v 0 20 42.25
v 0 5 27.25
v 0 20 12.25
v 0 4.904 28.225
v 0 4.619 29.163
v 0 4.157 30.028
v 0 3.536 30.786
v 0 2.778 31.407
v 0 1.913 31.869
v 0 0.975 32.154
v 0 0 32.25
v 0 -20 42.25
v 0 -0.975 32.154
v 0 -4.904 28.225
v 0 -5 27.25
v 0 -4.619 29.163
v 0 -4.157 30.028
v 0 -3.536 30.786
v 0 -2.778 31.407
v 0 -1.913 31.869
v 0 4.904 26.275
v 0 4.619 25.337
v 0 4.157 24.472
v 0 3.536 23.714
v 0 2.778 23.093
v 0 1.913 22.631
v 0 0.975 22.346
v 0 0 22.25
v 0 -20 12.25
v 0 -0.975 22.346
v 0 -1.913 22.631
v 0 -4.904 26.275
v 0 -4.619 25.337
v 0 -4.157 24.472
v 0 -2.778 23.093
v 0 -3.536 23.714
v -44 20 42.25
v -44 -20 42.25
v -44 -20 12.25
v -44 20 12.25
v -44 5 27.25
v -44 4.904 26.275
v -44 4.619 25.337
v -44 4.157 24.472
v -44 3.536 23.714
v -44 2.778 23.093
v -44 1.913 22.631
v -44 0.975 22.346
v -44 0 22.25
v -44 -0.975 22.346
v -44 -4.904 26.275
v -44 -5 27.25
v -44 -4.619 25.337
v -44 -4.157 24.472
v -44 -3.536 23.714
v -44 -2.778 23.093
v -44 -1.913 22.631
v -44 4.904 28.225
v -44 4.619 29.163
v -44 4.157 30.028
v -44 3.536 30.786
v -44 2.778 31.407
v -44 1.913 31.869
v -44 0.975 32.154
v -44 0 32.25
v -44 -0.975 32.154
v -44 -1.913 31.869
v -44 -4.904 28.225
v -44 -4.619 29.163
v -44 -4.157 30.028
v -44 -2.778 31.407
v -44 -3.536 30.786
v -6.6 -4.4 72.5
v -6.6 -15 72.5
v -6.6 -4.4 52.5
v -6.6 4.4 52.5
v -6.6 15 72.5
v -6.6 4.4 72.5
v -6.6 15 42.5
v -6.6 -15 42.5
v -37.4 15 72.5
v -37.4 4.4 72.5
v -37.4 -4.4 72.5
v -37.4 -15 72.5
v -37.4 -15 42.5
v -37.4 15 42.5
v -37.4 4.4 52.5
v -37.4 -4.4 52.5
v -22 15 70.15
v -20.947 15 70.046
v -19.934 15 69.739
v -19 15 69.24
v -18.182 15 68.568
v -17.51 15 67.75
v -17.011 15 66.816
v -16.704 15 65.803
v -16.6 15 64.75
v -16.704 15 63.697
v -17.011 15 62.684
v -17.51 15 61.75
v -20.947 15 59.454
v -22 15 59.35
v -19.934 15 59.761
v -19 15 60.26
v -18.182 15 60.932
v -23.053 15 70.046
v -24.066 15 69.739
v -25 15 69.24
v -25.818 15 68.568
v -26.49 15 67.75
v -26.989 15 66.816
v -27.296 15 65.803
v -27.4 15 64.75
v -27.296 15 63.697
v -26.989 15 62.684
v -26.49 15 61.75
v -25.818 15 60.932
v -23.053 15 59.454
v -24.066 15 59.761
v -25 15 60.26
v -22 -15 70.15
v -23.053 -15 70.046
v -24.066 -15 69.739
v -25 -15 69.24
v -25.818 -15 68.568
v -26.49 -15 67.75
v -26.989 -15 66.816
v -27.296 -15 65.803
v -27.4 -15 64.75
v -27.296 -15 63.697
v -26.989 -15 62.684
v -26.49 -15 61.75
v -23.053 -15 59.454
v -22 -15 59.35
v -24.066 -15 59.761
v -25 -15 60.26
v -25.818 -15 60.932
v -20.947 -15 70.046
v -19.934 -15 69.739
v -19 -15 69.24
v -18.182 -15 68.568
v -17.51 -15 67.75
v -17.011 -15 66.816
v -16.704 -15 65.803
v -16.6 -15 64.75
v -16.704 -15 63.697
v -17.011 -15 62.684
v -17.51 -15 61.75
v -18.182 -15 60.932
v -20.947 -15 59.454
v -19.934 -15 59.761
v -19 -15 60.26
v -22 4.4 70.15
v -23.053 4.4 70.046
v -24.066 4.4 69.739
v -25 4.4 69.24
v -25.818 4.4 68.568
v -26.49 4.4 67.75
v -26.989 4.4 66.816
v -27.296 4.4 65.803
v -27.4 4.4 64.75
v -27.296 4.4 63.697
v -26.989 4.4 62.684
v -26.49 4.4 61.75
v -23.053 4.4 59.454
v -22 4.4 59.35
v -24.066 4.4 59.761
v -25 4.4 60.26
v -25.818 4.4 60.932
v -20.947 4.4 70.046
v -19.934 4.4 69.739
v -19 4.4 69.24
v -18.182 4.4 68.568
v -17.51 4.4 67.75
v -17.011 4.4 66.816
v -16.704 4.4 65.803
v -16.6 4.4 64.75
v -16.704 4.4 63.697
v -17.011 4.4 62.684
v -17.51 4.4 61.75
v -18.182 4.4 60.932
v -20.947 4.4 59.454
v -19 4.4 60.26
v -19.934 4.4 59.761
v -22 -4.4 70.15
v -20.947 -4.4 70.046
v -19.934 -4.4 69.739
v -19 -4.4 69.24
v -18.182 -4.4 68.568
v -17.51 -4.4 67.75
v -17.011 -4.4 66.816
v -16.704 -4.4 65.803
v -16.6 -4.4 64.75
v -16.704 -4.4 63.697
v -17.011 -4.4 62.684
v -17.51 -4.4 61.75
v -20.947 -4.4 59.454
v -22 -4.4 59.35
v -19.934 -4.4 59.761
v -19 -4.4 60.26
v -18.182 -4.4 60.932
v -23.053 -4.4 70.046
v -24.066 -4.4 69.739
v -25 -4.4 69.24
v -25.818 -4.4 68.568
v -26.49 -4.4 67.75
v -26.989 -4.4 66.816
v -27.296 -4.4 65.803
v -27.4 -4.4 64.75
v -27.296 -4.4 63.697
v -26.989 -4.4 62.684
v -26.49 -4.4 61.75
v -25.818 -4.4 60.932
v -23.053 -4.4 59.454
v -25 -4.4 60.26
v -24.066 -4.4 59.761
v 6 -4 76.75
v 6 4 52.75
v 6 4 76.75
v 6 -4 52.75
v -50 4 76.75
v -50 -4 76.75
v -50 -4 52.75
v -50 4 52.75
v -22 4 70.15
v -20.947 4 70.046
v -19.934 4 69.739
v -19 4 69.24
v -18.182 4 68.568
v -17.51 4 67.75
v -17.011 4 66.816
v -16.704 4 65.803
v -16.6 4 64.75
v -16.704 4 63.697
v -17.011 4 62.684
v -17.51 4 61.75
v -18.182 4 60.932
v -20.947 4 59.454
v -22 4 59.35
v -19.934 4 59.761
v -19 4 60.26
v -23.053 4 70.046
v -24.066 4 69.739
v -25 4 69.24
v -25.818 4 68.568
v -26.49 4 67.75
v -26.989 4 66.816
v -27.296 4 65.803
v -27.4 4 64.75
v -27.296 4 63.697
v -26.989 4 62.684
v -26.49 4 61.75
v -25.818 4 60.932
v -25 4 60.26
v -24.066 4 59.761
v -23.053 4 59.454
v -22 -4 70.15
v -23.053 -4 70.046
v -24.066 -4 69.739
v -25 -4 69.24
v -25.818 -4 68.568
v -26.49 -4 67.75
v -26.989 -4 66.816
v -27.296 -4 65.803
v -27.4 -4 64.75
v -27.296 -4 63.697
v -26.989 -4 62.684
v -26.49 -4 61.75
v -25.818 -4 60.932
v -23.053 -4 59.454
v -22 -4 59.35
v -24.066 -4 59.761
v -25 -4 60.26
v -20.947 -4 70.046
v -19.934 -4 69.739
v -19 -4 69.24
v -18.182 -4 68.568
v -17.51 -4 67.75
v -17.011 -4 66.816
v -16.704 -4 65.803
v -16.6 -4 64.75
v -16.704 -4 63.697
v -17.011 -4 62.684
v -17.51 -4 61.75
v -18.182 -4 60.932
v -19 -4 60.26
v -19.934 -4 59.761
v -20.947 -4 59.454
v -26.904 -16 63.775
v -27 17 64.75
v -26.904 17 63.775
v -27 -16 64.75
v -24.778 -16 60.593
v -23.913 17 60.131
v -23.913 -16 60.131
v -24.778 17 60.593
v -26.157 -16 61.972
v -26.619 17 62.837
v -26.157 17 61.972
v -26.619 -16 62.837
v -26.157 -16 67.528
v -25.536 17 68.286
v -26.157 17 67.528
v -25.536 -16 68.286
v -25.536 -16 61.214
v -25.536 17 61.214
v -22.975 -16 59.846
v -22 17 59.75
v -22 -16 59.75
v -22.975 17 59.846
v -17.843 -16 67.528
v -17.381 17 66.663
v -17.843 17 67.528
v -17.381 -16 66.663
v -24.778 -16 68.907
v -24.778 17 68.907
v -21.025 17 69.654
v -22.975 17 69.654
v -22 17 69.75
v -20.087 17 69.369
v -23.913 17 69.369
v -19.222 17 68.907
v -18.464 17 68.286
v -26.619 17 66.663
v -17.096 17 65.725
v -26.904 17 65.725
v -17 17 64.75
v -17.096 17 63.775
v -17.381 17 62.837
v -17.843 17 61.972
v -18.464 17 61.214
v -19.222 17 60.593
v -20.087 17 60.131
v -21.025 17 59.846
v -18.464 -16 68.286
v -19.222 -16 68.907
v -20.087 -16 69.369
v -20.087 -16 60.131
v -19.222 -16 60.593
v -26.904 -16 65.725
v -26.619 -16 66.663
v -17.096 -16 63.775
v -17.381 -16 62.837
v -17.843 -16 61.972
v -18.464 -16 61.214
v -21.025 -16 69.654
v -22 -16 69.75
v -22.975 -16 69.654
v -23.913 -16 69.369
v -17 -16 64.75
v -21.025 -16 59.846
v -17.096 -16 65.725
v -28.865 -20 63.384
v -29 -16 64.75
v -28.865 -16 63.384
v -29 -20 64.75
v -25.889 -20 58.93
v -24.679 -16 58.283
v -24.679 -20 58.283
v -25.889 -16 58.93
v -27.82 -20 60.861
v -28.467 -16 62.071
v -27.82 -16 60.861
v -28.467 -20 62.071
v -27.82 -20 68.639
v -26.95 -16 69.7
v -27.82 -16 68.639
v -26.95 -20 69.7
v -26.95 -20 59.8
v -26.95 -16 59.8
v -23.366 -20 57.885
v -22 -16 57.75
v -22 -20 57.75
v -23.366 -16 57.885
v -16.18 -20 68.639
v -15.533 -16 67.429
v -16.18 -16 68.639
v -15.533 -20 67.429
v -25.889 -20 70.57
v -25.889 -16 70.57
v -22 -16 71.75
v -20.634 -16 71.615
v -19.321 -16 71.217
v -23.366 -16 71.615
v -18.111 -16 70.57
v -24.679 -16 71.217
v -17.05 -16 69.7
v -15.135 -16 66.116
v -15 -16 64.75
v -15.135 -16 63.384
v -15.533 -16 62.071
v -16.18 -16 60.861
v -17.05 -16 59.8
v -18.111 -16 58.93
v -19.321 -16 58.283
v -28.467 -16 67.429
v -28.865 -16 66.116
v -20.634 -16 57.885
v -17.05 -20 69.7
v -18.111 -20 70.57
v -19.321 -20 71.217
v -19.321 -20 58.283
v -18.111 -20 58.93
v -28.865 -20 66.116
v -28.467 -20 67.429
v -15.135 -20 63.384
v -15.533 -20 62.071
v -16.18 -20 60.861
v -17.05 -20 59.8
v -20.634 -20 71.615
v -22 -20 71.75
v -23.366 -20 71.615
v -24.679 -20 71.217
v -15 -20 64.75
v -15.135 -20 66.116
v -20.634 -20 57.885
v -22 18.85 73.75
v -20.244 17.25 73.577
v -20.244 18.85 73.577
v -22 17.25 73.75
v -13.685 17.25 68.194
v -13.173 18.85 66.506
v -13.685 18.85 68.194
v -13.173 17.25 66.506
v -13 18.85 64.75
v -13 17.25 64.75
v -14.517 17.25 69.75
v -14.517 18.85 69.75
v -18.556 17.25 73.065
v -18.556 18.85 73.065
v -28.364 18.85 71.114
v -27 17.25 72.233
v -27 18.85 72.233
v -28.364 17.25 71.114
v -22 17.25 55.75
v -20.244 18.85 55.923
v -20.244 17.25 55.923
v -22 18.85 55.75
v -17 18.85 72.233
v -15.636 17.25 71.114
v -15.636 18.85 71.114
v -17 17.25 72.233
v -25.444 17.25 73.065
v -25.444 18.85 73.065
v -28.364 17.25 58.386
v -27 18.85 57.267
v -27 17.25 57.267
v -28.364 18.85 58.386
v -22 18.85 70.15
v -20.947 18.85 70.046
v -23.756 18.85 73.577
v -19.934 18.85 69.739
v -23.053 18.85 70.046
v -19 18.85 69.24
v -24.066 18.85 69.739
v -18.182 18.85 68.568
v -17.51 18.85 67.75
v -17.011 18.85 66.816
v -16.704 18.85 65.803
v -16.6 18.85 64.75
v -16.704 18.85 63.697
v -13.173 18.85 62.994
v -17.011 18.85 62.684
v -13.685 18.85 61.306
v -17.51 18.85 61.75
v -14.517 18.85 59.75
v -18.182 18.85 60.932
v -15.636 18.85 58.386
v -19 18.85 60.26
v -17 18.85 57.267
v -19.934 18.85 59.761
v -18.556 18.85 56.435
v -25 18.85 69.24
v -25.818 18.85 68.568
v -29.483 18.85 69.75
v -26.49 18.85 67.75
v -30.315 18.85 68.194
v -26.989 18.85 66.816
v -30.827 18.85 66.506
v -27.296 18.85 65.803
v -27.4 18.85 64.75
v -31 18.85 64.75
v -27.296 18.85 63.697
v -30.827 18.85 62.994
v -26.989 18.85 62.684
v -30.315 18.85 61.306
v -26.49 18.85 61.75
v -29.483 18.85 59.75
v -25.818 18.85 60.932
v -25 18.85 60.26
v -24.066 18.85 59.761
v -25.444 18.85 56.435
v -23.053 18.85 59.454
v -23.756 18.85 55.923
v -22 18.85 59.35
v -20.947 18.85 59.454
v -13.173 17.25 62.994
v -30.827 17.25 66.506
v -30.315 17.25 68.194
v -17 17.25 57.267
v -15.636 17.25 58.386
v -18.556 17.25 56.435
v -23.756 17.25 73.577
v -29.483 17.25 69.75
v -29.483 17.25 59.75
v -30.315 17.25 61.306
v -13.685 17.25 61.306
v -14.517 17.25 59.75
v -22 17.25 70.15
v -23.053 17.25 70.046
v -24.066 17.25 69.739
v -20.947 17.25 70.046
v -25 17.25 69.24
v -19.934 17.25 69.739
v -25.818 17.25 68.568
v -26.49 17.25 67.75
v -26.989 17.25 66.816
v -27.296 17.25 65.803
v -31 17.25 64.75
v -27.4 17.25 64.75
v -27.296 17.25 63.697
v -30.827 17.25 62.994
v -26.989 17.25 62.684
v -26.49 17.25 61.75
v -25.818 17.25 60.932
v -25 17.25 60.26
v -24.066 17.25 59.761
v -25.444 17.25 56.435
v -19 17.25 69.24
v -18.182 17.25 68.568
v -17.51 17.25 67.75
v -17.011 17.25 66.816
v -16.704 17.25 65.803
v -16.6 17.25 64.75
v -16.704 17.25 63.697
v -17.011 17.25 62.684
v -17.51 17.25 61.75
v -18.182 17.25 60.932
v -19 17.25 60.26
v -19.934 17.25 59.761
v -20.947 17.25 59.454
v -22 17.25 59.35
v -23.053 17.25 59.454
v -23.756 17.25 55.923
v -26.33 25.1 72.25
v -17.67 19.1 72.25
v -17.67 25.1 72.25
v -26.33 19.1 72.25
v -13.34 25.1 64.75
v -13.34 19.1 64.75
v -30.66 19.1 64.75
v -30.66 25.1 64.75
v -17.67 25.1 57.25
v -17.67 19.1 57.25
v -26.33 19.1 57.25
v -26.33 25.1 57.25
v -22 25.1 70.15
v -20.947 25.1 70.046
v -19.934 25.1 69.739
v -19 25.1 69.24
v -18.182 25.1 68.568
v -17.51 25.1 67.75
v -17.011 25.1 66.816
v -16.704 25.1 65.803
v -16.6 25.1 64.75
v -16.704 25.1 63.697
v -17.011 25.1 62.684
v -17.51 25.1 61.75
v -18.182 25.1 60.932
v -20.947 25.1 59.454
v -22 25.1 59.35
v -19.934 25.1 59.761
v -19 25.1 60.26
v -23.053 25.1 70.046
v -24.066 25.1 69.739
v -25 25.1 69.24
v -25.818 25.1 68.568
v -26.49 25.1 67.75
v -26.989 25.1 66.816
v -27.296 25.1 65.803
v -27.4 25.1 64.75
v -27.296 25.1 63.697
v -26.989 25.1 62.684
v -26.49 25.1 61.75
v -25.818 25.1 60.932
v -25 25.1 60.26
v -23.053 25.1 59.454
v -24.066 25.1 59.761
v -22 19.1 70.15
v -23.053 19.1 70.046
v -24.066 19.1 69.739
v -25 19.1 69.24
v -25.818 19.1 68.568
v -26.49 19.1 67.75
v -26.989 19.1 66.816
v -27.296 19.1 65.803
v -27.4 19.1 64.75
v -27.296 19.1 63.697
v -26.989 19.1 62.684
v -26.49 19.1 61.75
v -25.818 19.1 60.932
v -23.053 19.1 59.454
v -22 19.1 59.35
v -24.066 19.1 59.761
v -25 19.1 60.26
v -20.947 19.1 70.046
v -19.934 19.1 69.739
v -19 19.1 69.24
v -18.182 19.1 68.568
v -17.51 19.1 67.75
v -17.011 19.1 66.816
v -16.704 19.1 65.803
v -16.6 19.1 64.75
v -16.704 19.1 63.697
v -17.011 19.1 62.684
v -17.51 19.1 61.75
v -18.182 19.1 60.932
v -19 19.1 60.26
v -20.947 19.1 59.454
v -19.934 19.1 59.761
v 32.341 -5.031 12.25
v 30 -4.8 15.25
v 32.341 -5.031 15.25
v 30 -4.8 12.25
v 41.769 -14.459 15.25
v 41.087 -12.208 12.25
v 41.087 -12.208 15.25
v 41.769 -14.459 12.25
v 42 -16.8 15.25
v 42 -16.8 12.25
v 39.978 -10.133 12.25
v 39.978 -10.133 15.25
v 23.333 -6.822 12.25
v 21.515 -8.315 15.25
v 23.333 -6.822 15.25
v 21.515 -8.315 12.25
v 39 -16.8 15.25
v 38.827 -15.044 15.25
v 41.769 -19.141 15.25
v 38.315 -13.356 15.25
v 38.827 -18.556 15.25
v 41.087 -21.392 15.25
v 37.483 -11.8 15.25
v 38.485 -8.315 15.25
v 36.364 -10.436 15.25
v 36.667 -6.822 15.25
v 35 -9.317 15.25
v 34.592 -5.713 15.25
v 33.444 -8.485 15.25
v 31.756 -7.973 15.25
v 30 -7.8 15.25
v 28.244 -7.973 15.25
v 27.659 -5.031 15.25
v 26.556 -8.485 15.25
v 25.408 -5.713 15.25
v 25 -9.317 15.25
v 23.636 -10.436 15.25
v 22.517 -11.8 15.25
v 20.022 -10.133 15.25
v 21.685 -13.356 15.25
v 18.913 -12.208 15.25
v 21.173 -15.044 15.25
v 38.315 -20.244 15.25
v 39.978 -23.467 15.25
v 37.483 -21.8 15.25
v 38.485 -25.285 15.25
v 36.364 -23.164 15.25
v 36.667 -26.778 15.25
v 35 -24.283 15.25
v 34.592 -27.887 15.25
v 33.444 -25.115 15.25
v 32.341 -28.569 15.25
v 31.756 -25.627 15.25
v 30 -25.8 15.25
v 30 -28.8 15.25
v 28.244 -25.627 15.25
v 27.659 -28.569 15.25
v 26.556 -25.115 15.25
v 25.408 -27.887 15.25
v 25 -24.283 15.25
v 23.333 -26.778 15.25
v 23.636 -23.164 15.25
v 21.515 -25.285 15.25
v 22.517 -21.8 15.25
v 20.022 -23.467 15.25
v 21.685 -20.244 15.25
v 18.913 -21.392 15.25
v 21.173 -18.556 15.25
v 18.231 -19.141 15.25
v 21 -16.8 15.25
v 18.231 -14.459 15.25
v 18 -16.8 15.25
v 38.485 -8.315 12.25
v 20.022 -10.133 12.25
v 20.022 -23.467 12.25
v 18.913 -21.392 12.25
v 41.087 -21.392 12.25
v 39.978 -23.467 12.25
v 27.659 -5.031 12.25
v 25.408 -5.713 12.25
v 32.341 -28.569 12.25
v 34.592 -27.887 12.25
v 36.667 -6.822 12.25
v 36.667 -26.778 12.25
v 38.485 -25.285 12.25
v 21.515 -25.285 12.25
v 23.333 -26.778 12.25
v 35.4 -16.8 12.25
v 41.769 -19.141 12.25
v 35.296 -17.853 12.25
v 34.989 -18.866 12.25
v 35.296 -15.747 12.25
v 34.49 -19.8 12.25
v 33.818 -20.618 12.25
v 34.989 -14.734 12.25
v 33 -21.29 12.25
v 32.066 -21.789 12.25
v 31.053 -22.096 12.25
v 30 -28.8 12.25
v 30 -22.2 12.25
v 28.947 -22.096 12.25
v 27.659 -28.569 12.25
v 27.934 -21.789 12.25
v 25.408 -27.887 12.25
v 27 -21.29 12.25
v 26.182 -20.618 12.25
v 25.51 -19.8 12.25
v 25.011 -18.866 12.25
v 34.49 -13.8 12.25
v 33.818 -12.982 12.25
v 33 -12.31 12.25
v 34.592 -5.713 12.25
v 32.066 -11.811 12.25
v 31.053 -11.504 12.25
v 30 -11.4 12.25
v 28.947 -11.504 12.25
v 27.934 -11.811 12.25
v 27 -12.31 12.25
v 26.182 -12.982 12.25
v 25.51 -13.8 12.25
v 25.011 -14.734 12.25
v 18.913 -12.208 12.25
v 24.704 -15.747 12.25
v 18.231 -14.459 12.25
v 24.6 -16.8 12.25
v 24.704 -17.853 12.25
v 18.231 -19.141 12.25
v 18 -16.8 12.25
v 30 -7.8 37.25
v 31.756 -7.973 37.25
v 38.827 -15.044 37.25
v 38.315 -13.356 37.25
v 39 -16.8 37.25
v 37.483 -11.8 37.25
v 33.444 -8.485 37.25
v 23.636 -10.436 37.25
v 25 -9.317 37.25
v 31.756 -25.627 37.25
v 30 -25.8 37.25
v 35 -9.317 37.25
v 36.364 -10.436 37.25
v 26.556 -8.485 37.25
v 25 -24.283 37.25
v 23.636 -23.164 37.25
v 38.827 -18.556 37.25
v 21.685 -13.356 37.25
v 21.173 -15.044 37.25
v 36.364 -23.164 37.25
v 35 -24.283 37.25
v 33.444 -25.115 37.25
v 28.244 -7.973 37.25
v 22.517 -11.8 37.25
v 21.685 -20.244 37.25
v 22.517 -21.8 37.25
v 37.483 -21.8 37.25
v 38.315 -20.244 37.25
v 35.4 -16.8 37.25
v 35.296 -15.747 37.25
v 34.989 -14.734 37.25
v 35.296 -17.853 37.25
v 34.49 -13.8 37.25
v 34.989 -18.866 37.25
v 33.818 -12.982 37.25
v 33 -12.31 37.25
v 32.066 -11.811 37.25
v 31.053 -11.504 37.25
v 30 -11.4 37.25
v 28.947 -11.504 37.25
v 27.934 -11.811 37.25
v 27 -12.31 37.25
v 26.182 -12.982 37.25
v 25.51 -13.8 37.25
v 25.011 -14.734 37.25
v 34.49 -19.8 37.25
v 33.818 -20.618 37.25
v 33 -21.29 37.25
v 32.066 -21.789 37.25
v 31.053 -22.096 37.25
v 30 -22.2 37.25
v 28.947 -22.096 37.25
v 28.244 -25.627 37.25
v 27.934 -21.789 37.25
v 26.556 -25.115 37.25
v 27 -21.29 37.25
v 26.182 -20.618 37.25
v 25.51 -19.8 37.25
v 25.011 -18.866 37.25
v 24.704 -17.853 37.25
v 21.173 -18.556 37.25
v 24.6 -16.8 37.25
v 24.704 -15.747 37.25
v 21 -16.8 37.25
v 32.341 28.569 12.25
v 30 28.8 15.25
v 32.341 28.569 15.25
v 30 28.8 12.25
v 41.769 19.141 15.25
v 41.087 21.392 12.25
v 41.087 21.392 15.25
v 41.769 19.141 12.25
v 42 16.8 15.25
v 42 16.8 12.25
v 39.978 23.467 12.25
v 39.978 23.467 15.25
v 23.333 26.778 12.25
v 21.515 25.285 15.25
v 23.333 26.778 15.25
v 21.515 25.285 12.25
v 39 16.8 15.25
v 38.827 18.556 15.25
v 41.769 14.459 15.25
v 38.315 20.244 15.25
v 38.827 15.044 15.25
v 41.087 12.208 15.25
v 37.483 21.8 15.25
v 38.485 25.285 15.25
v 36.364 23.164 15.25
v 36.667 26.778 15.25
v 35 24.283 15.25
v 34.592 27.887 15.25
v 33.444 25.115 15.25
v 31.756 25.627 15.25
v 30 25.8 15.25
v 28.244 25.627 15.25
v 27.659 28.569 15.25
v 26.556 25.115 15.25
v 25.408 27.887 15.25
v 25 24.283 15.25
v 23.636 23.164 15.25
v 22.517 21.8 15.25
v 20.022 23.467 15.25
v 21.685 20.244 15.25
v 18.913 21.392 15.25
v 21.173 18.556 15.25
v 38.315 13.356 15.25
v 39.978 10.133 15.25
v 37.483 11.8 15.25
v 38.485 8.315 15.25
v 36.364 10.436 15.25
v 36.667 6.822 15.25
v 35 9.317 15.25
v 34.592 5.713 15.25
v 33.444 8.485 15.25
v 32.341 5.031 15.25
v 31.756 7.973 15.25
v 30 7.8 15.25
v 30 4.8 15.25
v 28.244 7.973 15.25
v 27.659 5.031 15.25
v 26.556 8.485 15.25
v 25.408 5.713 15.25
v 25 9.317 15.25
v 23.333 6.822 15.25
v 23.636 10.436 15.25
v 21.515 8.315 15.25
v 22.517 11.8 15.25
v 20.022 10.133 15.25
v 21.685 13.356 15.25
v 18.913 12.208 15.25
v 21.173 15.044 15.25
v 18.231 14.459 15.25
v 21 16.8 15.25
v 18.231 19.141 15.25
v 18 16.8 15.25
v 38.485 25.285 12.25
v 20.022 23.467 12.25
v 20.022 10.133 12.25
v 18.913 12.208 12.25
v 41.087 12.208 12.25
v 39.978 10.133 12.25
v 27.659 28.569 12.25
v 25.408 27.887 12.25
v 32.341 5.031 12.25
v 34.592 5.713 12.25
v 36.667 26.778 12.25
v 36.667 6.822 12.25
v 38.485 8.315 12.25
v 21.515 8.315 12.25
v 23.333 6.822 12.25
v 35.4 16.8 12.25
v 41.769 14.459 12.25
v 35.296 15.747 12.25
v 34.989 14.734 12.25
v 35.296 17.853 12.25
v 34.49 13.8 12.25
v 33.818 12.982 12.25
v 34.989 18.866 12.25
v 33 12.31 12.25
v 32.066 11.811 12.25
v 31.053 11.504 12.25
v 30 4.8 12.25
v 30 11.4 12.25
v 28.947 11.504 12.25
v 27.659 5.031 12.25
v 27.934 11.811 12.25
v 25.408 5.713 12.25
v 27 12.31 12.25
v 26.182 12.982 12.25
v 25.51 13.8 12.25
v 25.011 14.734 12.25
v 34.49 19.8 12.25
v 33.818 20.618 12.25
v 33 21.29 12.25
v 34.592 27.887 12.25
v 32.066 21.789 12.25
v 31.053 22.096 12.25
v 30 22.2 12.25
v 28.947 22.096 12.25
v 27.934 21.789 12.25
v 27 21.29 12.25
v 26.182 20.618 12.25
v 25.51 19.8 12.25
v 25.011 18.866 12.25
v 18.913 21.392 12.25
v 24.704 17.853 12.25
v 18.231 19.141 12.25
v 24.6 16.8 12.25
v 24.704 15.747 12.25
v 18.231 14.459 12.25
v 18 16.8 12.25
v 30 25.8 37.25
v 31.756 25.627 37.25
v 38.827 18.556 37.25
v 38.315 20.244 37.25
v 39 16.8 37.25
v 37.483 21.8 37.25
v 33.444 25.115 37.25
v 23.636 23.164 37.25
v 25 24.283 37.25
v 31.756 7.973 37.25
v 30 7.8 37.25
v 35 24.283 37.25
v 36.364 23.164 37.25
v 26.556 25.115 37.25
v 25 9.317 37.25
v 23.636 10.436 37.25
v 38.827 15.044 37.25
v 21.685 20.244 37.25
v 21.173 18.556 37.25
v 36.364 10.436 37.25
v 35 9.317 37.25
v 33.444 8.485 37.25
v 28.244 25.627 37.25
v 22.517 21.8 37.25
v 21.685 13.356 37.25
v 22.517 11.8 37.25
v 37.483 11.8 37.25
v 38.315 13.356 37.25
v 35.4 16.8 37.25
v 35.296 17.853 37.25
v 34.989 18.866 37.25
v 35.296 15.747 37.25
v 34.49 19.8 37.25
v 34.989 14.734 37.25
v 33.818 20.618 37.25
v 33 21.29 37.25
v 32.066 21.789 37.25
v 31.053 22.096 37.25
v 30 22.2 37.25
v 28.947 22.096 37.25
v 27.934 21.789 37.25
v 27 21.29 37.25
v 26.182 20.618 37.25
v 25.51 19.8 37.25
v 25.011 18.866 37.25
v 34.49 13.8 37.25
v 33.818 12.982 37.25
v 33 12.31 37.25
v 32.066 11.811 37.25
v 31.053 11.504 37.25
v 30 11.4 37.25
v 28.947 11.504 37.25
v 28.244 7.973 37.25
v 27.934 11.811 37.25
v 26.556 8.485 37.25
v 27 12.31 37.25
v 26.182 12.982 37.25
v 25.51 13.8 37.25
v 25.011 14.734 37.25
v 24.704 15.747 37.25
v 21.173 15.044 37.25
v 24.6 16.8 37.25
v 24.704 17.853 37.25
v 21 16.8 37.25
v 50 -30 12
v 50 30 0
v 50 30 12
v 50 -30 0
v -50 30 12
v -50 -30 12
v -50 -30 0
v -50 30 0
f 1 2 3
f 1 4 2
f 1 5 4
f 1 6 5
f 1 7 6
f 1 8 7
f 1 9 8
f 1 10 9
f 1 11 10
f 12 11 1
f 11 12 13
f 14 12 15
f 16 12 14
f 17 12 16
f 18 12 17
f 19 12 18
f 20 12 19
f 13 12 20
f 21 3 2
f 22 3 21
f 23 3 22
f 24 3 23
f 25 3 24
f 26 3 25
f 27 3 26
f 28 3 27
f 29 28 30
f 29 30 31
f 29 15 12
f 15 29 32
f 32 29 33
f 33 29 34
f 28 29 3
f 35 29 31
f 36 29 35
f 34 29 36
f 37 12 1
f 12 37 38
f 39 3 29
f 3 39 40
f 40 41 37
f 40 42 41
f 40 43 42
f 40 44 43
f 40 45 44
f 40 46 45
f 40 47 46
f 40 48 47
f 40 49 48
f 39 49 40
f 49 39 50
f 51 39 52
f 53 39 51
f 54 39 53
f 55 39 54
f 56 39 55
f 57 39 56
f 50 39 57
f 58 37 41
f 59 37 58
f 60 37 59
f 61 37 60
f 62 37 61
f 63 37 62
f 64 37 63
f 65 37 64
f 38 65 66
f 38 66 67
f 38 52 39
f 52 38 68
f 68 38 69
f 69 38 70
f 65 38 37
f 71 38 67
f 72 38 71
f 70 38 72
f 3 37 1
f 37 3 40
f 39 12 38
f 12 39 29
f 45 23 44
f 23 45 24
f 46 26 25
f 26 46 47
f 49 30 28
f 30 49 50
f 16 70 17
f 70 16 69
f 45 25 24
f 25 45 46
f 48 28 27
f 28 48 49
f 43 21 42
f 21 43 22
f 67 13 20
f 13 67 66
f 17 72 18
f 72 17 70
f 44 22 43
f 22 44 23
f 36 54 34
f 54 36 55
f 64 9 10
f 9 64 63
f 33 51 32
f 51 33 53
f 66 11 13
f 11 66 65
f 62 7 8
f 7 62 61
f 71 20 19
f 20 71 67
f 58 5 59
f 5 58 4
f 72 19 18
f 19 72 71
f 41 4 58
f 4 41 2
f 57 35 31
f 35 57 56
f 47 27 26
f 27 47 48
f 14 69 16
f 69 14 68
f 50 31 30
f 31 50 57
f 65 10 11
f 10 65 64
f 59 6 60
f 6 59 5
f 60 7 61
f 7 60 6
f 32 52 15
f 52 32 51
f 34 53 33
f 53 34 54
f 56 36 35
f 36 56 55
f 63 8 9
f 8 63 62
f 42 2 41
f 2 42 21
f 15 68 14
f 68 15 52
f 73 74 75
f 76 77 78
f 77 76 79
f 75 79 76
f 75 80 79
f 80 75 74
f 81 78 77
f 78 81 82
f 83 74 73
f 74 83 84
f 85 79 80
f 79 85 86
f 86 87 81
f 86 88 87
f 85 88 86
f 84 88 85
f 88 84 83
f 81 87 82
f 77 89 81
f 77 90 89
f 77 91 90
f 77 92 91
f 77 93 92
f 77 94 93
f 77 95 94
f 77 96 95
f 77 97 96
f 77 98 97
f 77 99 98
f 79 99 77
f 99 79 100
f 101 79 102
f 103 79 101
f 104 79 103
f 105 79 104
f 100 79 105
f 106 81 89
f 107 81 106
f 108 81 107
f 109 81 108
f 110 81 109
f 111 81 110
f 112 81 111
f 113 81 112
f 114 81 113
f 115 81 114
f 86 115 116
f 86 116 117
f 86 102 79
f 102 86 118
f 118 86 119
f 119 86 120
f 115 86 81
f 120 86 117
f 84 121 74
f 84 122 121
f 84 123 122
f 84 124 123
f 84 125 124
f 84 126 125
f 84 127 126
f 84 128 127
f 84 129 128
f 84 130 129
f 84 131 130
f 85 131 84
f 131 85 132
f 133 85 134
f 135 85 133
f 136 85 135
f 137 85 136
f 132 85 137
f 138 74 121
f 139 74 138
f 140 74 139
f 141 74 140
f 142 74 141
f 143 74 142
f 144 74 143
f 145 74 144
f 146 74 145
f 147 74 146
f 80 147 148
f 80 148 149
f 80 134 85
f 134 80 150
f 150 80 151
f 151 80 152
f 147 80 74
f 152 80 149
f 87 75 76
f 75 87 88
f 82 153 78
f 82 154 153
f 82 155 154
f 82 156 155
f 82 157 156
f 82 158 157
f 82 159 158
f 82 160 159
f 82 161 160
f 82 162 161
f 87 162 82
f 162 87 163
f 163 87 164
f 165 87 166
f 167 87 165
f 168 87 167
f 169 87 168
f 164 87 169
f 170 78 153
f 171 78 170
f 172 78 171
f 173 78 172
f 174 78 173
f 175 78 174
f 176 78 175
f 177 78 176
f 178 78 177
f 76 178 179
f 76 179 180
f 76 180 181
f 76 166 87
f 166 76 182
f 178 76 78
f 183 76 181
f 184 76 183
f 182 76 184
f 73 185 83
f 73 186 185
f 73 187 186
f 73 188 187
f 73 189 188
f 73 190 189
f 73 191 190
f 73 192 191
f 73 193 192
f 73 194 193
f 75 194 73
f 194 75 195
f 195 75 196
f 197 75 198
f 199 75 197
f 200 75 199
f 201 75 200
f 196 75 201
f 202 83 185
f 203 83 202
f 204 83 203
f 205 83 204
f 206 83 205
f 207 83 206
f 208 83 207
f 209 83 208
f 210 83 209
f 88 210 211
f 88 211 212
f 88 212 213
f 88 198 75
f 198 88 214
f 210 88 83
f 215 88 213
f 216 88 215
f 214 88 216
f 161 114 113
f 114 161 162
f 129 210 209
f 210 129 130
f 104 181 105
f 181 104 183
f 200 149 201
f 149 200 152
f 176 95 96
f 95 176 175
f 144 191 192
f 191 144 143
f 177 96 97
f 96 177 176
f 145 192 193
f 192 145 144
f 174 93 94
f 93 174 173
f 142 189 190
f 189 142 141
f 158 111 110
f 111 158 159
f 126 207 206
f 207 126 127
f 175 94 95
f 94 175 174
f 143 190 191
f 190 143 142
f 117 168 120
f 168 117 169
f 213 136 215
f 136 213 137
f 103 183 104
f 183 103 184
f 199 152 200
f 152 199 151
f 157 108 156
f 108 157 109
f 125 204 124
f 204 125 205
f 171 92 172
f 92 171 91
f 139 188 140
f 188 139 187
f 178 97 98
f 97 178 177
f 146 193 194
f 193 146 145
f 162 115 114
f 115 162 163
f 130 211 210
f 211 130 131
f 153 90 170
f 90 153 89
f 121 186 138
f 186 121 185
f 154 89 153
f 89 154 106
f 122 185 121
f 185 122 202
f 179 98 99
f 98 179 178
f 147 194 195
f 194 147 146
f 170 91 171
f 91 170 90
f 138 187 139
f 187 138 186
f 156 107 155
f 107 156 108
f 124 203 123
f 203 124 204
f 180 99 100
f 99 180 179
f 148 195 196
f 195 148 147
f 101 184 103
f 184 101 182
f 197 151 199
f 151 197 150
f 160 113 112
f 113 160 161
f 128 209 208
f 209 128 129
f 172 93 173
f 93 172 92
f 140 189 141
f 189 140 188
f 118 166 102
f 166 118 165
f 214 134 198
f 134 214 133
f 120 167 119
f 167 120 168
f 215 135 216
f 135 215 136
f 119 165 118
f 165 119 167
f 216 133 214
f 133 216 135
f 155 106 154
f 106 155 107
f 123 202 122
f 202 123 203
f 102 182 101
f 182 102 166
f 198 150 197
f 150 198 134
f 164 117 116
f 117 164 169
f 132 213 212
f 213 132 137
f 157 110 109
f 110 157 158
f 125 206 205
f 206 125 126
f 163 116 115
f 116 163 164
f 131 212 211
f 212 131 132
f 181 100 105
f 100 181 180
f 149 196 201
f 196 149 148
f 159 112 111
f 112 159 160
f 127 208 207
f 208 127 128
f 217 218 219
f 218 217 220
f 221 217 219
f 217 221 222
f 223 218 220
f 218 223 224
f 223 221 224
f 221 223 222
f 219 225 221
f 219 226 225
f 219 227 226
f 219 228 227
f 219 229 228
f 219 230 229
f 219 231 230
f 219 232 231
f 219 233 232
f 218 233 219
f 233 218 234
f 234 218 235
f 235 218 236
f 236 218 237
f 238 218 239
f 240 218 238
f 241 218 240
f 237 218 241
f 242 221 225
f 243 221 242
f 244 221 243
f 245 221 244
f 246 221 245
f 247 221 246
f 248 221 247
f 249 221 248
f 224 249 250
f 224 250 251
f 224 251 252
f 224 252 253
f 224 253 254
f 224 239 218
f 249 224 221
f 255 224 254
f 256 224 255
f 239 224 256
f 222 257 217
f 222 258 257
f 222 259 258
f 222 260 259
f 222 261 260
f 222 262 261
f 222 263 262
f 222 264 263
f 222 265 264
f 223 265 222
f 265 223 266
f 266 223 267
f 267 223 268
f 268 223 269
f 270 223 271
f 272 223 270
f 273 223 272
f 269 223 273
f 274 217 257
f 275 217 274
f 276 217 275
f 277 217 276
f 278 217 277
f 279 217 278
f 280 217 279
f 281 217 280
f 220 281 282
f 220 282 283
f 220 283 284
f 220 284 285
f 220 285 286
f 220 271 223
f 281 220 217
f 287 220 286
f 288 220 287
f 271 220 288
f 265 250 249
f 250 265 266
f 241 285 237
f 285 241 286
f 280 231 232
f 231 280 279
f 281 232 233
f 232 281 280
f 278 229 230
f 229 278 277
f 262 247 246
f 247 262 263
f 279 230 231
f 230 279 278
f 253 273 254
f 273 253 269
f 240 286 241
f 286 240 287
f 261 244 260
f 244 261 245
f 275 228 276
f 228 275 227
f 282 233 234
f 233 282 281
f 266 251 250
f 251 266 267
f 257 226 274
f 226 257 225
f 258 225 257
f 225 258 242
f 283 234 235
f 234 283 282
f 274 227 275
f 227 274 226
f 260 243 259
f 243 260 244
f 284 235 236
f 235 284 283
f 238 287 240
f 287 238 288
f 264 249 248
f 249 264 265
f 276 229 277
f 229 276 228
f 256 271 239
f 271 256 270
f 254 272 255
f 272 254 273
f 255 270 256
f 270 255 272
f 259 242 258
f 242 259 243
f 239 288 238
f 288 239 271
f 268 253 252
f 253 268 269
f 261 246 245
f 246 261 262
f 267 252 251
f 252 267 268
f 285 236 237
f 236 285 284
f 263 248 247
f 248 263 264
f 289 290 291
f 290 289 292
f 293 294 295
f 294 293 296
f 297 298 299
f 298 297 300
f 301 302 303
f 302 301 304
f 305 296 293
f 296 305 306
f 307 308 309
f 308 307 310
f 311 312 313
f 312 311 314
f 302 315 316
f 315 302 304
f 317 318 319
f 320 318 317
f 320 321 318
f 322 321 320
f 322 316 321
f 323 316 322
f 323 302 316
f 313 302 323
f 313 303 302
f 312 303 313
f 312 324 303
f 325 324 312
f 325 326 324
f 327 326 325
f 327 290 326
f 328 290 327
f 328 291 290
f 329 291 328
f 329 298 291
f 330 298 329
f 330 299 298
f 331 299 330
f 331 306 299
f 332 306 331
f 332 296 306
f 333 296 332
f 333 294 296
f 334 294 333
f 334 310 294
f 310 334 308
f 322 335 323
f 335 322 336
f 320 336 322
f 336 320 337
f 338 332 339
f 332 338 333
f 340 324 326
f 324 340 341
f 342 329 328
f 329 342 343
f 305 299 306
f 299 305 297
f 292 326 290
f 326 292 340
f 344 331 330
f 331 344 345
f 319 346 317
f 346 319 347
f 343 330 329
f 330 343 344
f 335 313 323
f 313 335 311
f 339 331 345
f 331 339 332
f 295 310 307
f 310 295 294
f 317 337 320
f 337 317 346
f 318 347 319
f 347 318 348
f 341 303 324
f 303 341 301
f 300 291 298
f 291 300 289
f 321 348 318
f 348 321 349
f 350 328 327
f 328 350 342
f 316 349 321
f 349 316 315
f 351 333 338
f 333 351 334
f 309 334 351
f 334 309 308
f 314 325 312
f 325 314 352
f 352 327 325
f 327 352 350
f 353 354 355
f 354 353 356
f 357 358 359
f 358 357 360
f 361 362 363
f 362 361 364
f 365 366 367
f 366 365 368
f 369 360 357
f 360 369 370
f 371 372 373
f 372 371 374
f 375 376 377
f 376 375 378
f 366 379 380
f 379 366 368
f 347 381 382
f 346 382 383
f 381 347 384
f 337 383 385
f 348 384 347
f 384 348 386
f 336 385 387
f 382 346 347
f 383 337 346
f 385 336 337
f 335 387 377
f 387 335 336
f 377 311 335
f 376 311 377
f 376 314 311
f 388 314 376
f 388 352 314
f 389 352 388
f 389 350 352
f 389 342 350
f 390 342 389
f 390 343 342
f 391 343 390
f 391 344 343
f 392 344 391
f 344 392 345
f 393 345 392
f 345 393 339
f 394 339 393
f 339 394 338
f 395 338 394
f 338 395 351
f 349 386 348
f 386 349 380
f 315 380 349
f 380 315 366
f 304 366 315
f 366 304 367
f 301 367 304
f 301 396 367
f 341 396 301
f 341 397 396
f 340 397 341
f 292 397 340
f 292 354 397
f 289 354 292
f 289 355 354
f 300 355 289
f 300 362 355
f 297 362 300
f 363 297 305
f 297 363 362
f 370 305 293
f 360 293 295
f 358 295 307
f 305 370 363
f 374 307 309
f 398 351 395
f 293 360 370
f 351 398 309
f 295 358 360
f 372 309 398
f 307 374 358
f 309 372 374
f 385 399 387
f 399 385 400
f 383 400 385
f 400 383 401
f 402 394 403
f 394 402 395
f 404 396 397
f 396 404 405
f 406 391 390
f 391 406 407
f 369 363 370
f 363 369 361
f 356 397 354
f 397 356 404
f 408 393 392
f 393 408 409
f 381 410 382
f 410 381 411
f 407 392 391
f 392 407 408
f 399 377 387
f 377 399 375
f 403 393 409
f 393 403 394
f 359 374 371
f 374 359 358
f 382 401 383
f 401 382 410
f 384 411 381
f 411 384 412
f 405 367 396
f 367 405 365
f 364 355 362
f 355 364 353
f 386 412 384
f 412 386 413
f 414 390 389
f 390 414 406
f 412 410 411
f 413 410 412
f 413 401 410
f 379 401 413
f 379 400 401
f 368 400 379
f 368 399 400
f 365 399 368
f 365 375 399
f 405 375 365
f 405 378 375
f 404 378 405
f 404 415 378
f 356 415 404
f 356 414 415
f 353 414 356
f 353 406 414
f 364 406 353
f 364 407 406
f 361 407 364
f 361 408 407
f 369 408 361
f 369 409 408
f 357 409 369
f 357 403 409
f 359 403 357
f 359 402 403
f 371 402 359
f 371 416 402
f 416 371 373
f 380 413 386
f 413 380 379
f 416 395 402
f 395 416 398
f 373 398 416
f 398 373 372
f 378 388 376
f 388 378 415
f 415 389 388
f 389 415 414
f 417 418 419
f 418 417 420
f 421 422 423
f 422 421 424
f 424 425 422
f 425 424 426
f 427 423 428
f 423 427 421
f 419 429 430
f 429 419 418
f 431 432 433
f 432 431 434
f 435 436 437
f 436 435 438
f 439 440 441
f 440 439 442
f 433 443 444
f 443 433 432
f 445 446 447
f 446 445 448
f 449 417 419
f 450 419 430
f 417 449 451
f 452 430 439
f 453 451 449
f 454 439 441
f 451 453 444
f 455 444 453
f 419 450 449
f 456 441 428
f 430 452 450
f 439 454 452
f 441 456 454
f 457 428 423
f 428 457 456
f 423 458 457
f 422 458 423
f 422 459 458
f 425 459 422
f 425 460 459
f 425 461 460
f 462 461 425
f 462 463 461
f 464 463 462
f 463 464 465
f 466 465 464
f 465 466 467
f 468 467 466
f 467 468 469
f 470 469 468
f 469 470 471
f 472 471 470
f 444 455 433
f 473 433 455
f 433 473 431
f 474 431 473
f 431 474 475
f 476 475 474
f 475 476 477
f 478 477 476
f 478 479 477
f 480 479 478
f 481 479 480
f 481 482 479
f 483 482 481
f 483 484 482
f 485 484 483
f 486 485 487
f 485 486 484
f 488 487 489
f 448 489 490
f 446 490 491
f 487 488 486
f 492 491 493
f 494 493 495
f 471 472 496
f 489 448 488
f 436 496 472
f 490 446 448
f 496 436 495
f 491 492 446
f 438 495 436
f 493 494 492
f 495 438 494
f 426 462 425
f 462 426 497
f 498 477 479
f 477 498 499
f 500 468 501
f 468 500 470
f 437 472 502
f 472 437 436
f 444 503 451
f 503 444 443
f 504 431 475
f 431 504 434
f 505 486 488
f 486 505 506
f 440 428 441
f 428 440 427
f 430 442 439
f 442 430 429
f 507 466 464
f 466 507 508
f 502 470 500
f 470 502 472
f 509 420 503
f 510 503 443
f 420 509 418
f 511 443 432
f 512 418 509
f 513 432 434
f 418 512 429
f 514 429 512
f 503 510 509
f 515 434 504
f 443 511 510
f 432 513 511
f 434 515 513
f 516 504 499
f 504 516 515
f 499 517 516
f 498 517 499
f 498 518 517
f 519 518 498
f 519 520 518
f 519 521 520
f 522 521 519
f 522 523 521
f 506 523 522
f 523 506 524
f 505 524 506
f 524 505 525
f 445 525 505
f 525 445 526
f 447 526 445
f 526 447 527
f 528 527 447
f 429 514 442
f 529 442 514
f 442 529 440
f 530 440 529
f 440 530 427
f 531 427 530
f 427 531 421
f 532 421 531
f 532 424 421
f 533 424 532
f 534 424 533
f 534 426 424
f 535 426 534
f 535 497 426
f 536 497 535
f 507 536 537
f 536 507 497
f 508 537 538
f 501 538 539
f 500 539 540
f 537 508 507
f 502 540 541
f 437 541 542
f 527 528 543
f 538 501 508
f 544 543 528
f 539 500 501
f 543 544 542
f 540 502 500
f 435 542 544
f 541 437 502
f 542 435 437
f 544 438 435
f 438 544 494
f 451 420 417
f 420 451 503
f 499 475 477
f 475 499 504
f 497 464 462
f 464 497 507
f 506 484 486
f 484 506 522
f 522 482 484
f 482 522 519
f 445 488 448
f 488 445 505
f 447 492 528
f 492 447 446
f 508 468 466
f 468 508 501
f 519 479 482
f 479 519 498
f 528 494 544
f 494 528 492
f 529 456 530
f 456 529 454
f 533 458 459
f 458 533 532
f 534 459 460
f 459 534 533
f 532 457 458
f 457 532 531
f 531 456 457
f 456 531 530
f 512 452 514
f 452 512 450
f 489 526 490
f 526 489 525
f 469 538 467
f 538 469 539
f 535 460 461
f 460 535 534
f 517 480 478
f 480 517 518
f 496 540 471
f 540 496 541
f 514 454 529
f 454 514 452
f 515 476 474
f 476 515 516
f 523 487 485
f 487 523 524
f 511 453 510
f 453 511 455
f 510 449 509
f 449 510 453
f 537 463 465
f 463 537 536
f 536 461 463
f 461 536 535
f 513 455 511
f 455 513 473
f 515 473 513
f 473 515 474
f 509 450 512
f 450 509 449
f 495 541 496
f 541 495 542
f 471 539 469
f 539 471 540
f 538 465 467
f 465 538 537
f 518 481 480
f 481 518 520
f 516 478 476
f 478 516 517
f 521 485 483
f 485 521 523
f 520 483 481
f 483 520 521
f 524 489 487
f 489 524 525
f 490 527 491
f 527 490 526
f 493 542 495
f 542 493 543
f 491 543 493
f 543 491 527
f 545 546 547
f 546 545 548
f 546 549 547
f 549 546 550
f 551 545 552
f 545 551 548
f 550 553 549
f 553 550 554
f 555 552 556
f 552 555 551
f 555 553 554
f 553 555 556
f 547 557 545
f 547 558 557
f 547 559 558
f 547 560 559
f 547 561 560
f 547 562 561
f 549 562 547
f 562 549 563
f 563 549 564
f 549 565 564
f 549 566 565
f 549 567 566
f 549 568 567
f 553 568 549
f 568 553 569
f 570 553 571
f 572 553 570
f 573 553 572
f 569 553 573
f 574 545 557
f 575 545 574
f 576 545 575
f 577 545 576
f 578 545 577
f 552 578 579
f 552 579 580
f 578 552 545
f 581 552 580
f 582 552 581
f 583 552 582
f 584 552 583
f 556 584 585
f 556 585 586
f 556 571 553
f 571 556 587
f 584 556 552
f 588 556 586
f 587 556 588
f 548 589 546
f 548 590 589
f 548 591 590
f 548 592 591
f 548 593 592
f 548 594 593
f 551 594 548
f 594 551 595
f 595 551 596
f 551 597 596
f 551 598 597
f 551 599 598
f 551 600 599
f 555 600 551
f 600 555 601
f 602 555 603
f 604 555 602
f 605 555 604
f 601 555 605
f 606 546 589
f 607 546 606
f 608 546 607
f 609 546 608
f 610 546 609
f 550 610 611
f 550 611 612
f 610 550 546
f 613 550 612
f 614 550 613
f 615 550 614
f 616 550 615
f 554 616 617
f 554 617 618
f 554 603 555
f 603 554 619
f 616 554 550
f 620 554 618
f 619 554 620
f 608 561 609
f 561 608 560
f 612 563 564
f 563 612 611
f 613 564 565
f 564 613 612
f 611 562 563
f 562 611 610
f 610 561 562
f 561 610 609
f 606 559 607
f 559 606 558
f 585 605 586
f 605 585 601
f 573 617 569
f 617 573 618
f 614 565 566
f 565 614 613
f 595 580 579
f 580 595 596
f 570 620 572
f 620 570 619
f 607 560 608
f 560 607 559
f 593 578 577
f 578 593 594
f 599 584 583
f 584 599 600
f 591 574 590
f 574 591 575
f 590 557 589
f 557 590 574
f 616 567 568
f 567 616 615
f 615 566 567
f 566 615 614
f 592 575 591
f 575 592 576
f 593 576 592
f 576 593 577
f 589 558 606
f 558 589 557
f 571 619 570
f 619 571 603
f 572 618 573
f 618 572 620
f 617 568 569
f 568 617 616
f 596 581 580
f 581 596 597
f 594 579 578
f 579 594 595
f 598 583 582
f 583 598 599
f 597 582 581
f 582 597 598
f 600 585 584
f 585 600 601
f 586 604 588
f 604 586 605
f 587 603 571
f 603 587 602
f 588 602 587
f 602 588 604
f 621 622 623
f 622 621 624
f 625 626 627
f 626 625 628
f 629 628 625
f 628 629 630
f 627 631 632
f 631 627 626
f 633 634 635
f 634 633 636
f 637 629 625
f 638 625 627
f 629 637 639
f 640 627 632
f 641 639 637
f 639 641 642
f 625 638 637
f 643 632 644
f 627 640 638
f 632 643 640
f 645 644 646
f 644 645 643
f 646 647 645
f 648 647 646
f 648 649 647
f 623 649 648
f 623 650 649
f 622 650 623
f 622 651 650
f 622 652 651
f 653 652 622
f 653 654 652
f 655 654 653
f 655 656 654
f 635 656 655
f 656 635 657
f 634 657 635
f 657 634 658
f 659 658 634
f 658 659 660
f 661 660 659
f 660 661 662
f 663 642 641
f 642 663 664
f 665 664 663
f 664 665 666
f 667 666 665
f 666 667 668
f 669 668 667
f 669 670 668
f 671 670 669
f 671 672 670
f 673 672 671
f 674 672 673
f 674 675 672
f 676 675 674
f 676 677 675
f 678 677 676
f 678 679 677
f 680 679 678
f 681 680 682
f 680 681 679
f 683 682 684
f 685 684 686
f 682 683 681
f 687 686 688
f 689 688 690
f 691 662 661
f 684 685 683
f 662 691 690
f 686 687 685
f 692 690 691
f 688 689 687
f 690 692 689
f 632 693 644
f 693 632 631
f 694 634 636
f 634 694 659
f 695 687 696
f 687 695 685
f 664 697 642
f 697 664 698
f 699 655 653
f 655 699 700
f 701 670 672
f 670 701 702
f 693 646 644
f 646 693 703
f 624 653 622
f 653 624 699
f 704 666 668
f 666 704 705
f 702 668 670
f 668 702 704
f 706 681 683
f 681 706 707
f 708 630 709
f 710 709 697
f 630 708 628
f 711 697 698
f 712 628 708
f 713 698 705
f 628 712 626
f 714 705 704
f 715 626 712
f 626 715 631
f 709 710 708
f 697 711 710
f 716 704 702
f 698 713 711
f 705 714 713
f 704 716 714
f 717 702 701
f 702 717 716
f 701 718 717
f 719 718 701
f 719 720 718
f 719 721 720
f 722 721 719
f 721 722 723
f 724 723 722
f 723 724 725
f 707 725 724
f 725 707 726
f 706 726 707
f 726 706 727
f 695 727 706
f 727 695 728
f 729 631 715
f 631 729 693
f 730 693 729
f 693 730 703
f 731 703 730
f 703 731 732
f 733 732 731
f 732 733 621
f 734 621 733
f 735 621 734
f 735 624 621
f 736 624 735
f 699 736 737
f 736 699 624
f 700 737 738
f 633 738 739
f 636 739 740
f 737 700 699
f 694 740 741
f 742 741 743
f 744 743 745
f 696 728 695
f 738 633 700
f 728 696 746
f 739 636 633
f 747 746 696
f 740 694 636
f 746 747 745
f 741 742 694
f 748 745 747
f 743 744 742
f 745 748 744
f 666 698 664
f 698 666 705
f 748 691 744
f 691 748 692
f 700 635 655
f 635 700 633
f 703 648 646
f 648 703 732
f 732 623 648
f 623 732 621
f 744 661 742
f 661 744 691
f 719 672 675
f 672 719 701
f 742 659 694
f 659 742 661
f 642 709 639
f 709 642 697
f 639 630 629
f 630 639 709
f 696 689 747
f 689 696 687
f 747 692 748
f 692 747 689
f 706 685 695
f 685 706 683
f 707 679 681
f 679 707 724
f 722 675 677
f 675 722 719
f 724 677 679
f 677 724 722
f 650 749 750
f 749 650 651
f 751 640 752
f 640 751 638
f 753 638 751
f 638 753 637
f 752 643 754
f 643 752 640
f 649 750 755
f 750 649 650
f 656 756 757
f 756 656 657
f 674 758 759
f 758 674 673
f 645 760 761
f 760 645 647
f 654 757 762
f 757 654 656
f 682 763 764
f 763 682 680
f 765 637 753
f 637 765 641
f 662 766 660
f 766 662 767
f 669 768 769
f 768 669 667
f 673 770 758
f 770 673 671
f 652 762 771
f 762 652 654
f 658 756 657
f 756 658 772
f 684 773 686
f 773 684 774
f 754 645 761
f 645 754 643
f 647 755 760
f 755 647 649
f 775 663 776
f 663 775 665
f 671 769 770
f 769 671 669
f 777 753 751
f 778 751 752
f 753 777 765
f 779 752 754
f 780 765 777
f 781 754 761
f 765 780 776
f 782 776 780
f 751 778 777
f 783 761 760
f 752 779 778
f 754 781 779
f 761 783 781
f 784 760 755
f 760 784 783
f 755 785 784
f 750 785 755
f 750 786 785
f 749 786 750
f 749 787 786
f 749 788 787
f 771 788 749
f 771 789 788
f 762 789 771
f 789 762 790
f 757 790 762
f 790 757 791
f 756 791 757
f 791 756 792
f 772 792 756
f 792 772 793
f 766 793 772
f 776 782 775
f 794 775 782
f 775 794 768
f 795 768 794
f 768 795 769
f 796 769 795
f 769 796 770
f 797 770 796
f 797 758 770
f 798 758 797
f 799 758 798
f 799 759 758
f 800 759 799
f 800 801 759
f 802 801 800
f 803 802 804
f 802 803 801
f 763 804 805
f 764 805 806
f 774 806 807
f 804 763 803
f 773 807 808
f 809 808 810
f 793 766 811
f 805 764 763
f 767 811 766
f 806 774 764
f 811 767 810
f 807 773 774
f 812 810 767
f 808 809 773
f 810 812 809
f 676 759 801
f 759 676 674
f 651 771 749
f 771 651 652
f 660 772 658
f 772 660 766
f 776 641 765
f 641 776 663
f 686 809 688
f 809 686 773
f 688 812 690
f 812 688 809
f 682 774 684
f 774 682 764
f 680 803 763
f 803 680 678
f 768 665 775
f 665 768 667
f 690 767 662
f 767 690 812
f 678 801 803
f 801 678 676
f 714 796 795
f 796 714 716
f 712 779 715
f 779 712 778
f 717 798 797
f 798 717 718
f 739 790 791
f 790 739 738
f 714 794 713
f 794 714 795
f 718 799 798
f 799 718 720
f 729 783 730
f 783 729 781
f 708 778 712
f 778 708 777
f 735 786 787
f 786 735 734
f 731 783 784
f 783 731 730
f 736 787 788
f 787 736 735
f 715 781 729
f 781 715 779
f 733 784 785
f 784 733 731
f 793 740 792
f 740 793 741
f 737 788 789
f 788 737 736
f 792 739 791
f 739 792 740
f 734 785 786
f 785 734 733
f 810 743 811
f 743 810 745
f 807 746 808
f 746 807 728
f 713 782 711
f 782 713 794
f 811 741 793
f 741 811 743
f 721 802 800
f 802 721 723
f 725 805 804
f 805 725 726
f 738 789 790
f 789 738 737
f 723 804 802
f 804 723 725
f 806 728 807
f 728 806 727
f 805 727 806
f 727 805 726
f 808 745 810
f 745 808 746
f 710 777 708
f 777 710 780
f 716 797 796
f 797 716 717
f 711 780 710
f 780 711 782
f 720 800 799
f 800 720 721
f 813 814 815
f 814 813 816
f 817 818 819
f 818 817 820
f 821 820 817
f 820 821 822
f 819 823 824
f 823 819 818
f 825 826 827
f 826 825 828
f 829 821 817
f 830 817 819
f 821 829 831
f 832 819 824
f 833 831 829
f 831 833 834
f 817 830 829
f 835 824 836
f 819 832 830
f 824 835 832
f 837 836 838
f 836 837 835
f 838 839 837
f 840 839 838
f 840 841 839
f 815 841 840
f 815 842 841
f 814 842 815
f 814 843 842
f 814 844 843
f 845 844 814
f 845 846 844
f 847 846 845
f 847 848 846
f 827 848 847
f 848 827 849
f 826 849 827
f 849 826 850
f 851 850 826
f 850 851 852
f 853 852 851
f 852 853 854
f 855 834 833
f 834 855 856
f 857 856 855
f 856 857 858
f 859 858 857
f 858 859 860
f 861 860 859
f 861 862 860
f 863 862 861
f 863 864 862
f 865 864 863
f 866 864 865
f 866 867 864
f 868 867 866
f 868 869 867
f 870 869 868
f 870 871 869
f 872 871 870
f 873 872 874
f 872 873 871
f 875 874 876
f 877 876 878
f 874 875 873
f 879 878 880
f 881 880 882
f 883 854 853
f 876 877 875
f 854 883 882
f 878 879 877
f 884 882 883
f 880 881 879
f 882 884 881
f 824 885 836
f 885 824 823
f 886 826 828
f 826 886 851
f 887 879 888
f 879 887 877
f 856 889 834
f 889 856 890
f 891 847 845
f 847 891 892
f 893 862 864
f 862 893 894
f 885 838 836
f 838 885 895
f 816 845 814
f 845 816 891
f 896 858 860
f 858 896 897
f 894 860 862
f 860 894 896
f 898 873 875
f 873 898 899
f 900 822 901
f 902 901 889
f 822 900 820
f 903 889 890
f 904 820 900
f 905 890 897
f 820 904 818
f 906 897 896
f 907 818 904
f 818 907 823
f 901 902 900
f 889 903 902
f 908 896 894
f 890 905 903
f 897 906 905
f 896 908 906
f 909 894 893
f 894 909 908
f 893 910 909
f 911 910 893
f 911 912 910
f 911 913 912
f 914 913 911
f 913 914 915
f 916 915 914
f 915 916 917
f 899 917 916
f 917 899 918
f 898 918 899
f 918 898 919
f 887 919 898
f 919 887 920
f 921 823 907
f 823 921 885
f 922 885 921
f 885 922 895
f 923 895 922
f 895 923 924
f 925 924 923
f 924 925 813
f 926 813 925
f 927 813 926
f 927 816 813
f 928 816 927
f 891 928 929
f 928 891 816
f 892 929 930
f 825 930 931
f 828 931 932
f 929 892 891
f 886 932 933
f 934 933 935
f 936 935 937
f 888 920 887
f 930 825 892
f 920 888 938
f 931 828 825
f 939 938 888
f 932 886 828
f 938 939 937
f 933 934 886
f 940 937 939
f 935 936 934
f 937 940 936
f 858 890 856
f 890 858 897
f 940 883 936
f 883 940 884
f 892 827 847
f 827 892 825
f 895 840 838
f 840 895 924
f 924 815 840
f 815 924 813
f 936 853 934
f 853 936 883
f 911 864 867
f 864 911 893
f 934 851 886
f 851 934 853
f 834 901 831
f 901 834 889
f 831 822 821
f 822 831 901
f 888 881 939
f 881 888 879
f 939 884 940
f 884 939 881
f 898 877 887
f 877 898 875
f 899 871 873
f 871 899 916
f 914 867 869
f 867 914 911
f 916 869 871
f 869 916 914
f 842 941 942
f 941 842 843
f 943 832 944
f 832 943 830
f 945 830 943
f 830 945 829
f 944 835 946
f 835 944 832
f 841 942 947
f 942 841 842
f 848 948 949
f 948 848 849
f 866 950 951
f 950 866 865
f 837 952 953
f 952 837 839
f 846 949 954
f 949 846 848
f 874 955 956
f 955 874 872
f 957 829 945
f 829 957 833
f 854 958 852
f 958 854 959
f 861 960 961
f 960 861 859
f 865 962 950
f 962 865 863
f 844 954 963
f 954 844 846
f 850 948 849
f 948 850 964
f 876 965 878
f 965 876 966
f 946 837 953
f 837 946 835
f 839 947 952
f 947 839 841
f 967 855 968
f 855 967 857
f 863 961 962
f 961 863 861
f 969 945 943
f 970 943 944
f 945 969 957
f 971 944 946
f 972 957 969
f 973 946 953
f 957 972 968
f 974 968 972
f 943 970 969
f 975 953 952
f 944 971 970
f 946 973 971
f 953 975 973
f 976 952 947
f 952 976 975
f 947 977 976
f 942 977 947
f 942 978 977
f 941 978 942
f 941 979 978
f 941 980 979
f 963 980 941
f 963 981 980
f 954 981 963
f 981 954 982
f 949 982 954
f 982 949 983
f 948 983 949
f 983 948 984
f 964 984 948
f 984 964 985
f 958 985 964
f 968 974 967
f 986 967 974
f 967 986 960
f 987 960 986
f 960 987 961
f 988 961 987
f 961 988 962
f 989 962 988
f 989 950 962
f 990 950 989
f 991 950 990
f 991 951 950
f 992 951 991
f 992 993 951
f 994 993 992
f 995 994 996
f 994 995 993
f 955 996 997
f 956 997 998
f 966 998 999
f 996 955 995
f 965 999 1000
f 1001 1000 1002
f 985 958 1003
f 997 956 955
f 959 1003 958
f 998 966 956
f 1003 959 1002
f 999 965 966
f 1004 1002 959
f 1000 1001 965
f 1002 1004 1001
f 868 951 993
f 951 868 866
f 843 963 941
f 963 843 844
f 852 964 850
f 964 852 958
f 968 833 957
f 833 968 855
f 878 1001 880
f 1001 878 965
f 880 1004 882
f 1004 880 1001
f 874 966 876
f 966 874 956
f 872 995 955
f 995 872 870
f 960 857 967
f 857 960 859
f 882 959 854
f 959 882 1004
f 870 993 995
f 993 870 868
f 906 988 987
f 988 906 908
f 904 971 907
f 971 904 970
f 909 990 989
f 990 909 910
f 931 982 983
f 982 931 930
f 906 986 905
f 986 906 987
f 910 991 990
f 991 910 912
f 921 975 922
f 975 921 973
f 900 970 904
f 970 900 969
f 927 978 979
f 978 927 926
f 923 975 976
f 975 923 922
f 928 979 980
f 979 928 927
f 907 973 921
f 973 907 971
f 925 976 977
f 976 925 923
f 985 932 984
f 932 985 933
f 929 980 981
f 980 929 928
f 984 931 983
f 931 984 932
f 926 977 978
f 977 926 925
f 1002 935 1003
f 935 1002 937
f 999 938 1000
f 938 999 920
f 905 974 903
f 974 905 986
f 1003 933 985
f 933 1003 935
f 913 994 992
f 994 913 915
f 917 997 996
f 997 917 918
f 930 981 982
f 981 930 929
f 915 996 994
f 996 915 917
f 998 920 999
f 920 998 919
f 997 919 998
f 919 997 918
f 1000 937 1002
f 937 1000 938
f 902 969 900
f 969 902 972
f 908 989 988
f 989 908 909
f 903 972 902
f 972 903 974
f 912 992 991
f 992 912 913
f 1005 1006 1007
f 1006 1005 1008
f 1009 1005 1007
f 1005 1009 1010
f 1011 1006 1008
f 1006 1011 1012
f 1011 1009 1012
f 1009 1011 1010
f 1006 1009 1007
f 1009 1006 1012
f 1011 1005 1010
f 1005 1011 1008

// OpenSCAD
$fn = 32;

// ------------------------------------------------------------------------
// Indexing jig: plate 100 x 60 mm, pin d10
// Every part is its own module, assembly() places every instance.
// ------------------------------------------------------------------------

// --- part 1 ---
module jig_plate() {
  difference() {
    translate([-50, -30, 0]) cube([100, 60, 12]);
  }
}

// --- part 2 ---
module locator_block() {
  difference() {
    translate([-22, -20, 0]) cube([44, 40, 30]);
    translate([0, 0, 15]) rotate([0, 90, 0]) cylinder(h = 46, d = 10, center = true);
  }
}

// --- part 3 ---
module index_fork() {
  difference() {
    translate([-15.4, -15, 0]) cube([30.8, 30, 30]);
    translate([-16.4, -4.4, 10]) cube([32.8, 8.8, 21]);
    translate([0, 0, 22.25]) rotate([90, 0, 0]) cylinder(h = 32, d = 10.8, center = true);
  }
}

// --- part 4 ---
module index_arm() {
  difference() {
    translate([-28, -4, 0]) cube([56, 8, 24]);
    translate([0, 0, 12]) rotate([90, 0, 0]) cylinder(h = 10, d = 10.8, center = true);
  }
}

// --- part 5 ---
module index_pin() {
  rotate([0, 90, 0]) cylinder(h = 34, d = 10, center = true);
  translate([-20, 0, 0]) rotate([0, 90, 0]) cylinder(h = 4, d = 14);
}

// --- part 6 ---
module pin_washer() {
  difference() {
      translate([0, 0, 0]) cylinder(h = 1.6, d = 18);
      translate([0, 0, -1]) cylinder(h = 3.6, d = 10.8);
    }
}

// --- part 7 ---
module lock_nut() {
  difference() {
    linear_extrude(height = 6) polygon(points = [[8.66, 0], [4.33, 7.5], [-4.33, 7.5], [-8.66, 0], [-4.33, -7.5], [4.33, -7.5]]);
    translate([0, 0, -1]) cylinder(h = 8, d = 10.8);
  }
}

// --- part 8 ---
module guide_bush_a() {
  difference() {
    union() {
      cylinder(h = 3, d = 24);
      translate([0, 0, 3]) cylinder(h = 22, d = 18);
    }
    translate([0, 0, -1]) cylinder(h = 27, d = 10.8);
  }
}

// --- part 9 ---
module guide_bush_b() {
  difference() {
    union() {
      cylinder(h = 3, d = 24);
      translate([0, 0, 3]) cylinder(h = 22, d = 18);
    }
    translate([0, 0, -1]) cylinder(h = 27, d = 10.8);
  }
}

// --- assembly ---
module assembly() {
  color([0.80, 0.24, 0.20]) translate([0, 0, 0]) rotate([0, 0, 0]) jig_plate();
  color([0.20, 0.45, 0.75]) translate([-22, 0, 12.25]) rotate([0, 0, 0]) locator_block();
  color([0.25, 0.62, 0.32]) translate([-22, 0, 42.5]) rotate([0, 0, 0]) index_fork();
  color([0.92, 0.70, 0.18]) translate([-22, 0, 52.75]) rotate([0, 0, 0]) index_arm();
  color([0.58, 0.35, 0.70]) translate([-22, 0, 64.75]) rotate([0, 0, 90]) index_pin();
  color([0.16, 0.66, 0.66]) translate([-22, 18.85, 64.75]) rotate([90, 0, 0]) pin_washer();
  color([0.85, 0.48, 0.18]) translate([-22, 25.1, 64.75]) rotate([90, 0, 0]) lock_nut();
  color([0.55, 0.60, 0.65]) translate([30, -16.8, 12.25]) rotate([0, 0, 0]) guide_bush_a();
  color([0.75, 0.30, 0.55]) translate([30, 16.8, 12.25]) rotate([0, 0, 0]) guide_bush_b();
}

assembly();
